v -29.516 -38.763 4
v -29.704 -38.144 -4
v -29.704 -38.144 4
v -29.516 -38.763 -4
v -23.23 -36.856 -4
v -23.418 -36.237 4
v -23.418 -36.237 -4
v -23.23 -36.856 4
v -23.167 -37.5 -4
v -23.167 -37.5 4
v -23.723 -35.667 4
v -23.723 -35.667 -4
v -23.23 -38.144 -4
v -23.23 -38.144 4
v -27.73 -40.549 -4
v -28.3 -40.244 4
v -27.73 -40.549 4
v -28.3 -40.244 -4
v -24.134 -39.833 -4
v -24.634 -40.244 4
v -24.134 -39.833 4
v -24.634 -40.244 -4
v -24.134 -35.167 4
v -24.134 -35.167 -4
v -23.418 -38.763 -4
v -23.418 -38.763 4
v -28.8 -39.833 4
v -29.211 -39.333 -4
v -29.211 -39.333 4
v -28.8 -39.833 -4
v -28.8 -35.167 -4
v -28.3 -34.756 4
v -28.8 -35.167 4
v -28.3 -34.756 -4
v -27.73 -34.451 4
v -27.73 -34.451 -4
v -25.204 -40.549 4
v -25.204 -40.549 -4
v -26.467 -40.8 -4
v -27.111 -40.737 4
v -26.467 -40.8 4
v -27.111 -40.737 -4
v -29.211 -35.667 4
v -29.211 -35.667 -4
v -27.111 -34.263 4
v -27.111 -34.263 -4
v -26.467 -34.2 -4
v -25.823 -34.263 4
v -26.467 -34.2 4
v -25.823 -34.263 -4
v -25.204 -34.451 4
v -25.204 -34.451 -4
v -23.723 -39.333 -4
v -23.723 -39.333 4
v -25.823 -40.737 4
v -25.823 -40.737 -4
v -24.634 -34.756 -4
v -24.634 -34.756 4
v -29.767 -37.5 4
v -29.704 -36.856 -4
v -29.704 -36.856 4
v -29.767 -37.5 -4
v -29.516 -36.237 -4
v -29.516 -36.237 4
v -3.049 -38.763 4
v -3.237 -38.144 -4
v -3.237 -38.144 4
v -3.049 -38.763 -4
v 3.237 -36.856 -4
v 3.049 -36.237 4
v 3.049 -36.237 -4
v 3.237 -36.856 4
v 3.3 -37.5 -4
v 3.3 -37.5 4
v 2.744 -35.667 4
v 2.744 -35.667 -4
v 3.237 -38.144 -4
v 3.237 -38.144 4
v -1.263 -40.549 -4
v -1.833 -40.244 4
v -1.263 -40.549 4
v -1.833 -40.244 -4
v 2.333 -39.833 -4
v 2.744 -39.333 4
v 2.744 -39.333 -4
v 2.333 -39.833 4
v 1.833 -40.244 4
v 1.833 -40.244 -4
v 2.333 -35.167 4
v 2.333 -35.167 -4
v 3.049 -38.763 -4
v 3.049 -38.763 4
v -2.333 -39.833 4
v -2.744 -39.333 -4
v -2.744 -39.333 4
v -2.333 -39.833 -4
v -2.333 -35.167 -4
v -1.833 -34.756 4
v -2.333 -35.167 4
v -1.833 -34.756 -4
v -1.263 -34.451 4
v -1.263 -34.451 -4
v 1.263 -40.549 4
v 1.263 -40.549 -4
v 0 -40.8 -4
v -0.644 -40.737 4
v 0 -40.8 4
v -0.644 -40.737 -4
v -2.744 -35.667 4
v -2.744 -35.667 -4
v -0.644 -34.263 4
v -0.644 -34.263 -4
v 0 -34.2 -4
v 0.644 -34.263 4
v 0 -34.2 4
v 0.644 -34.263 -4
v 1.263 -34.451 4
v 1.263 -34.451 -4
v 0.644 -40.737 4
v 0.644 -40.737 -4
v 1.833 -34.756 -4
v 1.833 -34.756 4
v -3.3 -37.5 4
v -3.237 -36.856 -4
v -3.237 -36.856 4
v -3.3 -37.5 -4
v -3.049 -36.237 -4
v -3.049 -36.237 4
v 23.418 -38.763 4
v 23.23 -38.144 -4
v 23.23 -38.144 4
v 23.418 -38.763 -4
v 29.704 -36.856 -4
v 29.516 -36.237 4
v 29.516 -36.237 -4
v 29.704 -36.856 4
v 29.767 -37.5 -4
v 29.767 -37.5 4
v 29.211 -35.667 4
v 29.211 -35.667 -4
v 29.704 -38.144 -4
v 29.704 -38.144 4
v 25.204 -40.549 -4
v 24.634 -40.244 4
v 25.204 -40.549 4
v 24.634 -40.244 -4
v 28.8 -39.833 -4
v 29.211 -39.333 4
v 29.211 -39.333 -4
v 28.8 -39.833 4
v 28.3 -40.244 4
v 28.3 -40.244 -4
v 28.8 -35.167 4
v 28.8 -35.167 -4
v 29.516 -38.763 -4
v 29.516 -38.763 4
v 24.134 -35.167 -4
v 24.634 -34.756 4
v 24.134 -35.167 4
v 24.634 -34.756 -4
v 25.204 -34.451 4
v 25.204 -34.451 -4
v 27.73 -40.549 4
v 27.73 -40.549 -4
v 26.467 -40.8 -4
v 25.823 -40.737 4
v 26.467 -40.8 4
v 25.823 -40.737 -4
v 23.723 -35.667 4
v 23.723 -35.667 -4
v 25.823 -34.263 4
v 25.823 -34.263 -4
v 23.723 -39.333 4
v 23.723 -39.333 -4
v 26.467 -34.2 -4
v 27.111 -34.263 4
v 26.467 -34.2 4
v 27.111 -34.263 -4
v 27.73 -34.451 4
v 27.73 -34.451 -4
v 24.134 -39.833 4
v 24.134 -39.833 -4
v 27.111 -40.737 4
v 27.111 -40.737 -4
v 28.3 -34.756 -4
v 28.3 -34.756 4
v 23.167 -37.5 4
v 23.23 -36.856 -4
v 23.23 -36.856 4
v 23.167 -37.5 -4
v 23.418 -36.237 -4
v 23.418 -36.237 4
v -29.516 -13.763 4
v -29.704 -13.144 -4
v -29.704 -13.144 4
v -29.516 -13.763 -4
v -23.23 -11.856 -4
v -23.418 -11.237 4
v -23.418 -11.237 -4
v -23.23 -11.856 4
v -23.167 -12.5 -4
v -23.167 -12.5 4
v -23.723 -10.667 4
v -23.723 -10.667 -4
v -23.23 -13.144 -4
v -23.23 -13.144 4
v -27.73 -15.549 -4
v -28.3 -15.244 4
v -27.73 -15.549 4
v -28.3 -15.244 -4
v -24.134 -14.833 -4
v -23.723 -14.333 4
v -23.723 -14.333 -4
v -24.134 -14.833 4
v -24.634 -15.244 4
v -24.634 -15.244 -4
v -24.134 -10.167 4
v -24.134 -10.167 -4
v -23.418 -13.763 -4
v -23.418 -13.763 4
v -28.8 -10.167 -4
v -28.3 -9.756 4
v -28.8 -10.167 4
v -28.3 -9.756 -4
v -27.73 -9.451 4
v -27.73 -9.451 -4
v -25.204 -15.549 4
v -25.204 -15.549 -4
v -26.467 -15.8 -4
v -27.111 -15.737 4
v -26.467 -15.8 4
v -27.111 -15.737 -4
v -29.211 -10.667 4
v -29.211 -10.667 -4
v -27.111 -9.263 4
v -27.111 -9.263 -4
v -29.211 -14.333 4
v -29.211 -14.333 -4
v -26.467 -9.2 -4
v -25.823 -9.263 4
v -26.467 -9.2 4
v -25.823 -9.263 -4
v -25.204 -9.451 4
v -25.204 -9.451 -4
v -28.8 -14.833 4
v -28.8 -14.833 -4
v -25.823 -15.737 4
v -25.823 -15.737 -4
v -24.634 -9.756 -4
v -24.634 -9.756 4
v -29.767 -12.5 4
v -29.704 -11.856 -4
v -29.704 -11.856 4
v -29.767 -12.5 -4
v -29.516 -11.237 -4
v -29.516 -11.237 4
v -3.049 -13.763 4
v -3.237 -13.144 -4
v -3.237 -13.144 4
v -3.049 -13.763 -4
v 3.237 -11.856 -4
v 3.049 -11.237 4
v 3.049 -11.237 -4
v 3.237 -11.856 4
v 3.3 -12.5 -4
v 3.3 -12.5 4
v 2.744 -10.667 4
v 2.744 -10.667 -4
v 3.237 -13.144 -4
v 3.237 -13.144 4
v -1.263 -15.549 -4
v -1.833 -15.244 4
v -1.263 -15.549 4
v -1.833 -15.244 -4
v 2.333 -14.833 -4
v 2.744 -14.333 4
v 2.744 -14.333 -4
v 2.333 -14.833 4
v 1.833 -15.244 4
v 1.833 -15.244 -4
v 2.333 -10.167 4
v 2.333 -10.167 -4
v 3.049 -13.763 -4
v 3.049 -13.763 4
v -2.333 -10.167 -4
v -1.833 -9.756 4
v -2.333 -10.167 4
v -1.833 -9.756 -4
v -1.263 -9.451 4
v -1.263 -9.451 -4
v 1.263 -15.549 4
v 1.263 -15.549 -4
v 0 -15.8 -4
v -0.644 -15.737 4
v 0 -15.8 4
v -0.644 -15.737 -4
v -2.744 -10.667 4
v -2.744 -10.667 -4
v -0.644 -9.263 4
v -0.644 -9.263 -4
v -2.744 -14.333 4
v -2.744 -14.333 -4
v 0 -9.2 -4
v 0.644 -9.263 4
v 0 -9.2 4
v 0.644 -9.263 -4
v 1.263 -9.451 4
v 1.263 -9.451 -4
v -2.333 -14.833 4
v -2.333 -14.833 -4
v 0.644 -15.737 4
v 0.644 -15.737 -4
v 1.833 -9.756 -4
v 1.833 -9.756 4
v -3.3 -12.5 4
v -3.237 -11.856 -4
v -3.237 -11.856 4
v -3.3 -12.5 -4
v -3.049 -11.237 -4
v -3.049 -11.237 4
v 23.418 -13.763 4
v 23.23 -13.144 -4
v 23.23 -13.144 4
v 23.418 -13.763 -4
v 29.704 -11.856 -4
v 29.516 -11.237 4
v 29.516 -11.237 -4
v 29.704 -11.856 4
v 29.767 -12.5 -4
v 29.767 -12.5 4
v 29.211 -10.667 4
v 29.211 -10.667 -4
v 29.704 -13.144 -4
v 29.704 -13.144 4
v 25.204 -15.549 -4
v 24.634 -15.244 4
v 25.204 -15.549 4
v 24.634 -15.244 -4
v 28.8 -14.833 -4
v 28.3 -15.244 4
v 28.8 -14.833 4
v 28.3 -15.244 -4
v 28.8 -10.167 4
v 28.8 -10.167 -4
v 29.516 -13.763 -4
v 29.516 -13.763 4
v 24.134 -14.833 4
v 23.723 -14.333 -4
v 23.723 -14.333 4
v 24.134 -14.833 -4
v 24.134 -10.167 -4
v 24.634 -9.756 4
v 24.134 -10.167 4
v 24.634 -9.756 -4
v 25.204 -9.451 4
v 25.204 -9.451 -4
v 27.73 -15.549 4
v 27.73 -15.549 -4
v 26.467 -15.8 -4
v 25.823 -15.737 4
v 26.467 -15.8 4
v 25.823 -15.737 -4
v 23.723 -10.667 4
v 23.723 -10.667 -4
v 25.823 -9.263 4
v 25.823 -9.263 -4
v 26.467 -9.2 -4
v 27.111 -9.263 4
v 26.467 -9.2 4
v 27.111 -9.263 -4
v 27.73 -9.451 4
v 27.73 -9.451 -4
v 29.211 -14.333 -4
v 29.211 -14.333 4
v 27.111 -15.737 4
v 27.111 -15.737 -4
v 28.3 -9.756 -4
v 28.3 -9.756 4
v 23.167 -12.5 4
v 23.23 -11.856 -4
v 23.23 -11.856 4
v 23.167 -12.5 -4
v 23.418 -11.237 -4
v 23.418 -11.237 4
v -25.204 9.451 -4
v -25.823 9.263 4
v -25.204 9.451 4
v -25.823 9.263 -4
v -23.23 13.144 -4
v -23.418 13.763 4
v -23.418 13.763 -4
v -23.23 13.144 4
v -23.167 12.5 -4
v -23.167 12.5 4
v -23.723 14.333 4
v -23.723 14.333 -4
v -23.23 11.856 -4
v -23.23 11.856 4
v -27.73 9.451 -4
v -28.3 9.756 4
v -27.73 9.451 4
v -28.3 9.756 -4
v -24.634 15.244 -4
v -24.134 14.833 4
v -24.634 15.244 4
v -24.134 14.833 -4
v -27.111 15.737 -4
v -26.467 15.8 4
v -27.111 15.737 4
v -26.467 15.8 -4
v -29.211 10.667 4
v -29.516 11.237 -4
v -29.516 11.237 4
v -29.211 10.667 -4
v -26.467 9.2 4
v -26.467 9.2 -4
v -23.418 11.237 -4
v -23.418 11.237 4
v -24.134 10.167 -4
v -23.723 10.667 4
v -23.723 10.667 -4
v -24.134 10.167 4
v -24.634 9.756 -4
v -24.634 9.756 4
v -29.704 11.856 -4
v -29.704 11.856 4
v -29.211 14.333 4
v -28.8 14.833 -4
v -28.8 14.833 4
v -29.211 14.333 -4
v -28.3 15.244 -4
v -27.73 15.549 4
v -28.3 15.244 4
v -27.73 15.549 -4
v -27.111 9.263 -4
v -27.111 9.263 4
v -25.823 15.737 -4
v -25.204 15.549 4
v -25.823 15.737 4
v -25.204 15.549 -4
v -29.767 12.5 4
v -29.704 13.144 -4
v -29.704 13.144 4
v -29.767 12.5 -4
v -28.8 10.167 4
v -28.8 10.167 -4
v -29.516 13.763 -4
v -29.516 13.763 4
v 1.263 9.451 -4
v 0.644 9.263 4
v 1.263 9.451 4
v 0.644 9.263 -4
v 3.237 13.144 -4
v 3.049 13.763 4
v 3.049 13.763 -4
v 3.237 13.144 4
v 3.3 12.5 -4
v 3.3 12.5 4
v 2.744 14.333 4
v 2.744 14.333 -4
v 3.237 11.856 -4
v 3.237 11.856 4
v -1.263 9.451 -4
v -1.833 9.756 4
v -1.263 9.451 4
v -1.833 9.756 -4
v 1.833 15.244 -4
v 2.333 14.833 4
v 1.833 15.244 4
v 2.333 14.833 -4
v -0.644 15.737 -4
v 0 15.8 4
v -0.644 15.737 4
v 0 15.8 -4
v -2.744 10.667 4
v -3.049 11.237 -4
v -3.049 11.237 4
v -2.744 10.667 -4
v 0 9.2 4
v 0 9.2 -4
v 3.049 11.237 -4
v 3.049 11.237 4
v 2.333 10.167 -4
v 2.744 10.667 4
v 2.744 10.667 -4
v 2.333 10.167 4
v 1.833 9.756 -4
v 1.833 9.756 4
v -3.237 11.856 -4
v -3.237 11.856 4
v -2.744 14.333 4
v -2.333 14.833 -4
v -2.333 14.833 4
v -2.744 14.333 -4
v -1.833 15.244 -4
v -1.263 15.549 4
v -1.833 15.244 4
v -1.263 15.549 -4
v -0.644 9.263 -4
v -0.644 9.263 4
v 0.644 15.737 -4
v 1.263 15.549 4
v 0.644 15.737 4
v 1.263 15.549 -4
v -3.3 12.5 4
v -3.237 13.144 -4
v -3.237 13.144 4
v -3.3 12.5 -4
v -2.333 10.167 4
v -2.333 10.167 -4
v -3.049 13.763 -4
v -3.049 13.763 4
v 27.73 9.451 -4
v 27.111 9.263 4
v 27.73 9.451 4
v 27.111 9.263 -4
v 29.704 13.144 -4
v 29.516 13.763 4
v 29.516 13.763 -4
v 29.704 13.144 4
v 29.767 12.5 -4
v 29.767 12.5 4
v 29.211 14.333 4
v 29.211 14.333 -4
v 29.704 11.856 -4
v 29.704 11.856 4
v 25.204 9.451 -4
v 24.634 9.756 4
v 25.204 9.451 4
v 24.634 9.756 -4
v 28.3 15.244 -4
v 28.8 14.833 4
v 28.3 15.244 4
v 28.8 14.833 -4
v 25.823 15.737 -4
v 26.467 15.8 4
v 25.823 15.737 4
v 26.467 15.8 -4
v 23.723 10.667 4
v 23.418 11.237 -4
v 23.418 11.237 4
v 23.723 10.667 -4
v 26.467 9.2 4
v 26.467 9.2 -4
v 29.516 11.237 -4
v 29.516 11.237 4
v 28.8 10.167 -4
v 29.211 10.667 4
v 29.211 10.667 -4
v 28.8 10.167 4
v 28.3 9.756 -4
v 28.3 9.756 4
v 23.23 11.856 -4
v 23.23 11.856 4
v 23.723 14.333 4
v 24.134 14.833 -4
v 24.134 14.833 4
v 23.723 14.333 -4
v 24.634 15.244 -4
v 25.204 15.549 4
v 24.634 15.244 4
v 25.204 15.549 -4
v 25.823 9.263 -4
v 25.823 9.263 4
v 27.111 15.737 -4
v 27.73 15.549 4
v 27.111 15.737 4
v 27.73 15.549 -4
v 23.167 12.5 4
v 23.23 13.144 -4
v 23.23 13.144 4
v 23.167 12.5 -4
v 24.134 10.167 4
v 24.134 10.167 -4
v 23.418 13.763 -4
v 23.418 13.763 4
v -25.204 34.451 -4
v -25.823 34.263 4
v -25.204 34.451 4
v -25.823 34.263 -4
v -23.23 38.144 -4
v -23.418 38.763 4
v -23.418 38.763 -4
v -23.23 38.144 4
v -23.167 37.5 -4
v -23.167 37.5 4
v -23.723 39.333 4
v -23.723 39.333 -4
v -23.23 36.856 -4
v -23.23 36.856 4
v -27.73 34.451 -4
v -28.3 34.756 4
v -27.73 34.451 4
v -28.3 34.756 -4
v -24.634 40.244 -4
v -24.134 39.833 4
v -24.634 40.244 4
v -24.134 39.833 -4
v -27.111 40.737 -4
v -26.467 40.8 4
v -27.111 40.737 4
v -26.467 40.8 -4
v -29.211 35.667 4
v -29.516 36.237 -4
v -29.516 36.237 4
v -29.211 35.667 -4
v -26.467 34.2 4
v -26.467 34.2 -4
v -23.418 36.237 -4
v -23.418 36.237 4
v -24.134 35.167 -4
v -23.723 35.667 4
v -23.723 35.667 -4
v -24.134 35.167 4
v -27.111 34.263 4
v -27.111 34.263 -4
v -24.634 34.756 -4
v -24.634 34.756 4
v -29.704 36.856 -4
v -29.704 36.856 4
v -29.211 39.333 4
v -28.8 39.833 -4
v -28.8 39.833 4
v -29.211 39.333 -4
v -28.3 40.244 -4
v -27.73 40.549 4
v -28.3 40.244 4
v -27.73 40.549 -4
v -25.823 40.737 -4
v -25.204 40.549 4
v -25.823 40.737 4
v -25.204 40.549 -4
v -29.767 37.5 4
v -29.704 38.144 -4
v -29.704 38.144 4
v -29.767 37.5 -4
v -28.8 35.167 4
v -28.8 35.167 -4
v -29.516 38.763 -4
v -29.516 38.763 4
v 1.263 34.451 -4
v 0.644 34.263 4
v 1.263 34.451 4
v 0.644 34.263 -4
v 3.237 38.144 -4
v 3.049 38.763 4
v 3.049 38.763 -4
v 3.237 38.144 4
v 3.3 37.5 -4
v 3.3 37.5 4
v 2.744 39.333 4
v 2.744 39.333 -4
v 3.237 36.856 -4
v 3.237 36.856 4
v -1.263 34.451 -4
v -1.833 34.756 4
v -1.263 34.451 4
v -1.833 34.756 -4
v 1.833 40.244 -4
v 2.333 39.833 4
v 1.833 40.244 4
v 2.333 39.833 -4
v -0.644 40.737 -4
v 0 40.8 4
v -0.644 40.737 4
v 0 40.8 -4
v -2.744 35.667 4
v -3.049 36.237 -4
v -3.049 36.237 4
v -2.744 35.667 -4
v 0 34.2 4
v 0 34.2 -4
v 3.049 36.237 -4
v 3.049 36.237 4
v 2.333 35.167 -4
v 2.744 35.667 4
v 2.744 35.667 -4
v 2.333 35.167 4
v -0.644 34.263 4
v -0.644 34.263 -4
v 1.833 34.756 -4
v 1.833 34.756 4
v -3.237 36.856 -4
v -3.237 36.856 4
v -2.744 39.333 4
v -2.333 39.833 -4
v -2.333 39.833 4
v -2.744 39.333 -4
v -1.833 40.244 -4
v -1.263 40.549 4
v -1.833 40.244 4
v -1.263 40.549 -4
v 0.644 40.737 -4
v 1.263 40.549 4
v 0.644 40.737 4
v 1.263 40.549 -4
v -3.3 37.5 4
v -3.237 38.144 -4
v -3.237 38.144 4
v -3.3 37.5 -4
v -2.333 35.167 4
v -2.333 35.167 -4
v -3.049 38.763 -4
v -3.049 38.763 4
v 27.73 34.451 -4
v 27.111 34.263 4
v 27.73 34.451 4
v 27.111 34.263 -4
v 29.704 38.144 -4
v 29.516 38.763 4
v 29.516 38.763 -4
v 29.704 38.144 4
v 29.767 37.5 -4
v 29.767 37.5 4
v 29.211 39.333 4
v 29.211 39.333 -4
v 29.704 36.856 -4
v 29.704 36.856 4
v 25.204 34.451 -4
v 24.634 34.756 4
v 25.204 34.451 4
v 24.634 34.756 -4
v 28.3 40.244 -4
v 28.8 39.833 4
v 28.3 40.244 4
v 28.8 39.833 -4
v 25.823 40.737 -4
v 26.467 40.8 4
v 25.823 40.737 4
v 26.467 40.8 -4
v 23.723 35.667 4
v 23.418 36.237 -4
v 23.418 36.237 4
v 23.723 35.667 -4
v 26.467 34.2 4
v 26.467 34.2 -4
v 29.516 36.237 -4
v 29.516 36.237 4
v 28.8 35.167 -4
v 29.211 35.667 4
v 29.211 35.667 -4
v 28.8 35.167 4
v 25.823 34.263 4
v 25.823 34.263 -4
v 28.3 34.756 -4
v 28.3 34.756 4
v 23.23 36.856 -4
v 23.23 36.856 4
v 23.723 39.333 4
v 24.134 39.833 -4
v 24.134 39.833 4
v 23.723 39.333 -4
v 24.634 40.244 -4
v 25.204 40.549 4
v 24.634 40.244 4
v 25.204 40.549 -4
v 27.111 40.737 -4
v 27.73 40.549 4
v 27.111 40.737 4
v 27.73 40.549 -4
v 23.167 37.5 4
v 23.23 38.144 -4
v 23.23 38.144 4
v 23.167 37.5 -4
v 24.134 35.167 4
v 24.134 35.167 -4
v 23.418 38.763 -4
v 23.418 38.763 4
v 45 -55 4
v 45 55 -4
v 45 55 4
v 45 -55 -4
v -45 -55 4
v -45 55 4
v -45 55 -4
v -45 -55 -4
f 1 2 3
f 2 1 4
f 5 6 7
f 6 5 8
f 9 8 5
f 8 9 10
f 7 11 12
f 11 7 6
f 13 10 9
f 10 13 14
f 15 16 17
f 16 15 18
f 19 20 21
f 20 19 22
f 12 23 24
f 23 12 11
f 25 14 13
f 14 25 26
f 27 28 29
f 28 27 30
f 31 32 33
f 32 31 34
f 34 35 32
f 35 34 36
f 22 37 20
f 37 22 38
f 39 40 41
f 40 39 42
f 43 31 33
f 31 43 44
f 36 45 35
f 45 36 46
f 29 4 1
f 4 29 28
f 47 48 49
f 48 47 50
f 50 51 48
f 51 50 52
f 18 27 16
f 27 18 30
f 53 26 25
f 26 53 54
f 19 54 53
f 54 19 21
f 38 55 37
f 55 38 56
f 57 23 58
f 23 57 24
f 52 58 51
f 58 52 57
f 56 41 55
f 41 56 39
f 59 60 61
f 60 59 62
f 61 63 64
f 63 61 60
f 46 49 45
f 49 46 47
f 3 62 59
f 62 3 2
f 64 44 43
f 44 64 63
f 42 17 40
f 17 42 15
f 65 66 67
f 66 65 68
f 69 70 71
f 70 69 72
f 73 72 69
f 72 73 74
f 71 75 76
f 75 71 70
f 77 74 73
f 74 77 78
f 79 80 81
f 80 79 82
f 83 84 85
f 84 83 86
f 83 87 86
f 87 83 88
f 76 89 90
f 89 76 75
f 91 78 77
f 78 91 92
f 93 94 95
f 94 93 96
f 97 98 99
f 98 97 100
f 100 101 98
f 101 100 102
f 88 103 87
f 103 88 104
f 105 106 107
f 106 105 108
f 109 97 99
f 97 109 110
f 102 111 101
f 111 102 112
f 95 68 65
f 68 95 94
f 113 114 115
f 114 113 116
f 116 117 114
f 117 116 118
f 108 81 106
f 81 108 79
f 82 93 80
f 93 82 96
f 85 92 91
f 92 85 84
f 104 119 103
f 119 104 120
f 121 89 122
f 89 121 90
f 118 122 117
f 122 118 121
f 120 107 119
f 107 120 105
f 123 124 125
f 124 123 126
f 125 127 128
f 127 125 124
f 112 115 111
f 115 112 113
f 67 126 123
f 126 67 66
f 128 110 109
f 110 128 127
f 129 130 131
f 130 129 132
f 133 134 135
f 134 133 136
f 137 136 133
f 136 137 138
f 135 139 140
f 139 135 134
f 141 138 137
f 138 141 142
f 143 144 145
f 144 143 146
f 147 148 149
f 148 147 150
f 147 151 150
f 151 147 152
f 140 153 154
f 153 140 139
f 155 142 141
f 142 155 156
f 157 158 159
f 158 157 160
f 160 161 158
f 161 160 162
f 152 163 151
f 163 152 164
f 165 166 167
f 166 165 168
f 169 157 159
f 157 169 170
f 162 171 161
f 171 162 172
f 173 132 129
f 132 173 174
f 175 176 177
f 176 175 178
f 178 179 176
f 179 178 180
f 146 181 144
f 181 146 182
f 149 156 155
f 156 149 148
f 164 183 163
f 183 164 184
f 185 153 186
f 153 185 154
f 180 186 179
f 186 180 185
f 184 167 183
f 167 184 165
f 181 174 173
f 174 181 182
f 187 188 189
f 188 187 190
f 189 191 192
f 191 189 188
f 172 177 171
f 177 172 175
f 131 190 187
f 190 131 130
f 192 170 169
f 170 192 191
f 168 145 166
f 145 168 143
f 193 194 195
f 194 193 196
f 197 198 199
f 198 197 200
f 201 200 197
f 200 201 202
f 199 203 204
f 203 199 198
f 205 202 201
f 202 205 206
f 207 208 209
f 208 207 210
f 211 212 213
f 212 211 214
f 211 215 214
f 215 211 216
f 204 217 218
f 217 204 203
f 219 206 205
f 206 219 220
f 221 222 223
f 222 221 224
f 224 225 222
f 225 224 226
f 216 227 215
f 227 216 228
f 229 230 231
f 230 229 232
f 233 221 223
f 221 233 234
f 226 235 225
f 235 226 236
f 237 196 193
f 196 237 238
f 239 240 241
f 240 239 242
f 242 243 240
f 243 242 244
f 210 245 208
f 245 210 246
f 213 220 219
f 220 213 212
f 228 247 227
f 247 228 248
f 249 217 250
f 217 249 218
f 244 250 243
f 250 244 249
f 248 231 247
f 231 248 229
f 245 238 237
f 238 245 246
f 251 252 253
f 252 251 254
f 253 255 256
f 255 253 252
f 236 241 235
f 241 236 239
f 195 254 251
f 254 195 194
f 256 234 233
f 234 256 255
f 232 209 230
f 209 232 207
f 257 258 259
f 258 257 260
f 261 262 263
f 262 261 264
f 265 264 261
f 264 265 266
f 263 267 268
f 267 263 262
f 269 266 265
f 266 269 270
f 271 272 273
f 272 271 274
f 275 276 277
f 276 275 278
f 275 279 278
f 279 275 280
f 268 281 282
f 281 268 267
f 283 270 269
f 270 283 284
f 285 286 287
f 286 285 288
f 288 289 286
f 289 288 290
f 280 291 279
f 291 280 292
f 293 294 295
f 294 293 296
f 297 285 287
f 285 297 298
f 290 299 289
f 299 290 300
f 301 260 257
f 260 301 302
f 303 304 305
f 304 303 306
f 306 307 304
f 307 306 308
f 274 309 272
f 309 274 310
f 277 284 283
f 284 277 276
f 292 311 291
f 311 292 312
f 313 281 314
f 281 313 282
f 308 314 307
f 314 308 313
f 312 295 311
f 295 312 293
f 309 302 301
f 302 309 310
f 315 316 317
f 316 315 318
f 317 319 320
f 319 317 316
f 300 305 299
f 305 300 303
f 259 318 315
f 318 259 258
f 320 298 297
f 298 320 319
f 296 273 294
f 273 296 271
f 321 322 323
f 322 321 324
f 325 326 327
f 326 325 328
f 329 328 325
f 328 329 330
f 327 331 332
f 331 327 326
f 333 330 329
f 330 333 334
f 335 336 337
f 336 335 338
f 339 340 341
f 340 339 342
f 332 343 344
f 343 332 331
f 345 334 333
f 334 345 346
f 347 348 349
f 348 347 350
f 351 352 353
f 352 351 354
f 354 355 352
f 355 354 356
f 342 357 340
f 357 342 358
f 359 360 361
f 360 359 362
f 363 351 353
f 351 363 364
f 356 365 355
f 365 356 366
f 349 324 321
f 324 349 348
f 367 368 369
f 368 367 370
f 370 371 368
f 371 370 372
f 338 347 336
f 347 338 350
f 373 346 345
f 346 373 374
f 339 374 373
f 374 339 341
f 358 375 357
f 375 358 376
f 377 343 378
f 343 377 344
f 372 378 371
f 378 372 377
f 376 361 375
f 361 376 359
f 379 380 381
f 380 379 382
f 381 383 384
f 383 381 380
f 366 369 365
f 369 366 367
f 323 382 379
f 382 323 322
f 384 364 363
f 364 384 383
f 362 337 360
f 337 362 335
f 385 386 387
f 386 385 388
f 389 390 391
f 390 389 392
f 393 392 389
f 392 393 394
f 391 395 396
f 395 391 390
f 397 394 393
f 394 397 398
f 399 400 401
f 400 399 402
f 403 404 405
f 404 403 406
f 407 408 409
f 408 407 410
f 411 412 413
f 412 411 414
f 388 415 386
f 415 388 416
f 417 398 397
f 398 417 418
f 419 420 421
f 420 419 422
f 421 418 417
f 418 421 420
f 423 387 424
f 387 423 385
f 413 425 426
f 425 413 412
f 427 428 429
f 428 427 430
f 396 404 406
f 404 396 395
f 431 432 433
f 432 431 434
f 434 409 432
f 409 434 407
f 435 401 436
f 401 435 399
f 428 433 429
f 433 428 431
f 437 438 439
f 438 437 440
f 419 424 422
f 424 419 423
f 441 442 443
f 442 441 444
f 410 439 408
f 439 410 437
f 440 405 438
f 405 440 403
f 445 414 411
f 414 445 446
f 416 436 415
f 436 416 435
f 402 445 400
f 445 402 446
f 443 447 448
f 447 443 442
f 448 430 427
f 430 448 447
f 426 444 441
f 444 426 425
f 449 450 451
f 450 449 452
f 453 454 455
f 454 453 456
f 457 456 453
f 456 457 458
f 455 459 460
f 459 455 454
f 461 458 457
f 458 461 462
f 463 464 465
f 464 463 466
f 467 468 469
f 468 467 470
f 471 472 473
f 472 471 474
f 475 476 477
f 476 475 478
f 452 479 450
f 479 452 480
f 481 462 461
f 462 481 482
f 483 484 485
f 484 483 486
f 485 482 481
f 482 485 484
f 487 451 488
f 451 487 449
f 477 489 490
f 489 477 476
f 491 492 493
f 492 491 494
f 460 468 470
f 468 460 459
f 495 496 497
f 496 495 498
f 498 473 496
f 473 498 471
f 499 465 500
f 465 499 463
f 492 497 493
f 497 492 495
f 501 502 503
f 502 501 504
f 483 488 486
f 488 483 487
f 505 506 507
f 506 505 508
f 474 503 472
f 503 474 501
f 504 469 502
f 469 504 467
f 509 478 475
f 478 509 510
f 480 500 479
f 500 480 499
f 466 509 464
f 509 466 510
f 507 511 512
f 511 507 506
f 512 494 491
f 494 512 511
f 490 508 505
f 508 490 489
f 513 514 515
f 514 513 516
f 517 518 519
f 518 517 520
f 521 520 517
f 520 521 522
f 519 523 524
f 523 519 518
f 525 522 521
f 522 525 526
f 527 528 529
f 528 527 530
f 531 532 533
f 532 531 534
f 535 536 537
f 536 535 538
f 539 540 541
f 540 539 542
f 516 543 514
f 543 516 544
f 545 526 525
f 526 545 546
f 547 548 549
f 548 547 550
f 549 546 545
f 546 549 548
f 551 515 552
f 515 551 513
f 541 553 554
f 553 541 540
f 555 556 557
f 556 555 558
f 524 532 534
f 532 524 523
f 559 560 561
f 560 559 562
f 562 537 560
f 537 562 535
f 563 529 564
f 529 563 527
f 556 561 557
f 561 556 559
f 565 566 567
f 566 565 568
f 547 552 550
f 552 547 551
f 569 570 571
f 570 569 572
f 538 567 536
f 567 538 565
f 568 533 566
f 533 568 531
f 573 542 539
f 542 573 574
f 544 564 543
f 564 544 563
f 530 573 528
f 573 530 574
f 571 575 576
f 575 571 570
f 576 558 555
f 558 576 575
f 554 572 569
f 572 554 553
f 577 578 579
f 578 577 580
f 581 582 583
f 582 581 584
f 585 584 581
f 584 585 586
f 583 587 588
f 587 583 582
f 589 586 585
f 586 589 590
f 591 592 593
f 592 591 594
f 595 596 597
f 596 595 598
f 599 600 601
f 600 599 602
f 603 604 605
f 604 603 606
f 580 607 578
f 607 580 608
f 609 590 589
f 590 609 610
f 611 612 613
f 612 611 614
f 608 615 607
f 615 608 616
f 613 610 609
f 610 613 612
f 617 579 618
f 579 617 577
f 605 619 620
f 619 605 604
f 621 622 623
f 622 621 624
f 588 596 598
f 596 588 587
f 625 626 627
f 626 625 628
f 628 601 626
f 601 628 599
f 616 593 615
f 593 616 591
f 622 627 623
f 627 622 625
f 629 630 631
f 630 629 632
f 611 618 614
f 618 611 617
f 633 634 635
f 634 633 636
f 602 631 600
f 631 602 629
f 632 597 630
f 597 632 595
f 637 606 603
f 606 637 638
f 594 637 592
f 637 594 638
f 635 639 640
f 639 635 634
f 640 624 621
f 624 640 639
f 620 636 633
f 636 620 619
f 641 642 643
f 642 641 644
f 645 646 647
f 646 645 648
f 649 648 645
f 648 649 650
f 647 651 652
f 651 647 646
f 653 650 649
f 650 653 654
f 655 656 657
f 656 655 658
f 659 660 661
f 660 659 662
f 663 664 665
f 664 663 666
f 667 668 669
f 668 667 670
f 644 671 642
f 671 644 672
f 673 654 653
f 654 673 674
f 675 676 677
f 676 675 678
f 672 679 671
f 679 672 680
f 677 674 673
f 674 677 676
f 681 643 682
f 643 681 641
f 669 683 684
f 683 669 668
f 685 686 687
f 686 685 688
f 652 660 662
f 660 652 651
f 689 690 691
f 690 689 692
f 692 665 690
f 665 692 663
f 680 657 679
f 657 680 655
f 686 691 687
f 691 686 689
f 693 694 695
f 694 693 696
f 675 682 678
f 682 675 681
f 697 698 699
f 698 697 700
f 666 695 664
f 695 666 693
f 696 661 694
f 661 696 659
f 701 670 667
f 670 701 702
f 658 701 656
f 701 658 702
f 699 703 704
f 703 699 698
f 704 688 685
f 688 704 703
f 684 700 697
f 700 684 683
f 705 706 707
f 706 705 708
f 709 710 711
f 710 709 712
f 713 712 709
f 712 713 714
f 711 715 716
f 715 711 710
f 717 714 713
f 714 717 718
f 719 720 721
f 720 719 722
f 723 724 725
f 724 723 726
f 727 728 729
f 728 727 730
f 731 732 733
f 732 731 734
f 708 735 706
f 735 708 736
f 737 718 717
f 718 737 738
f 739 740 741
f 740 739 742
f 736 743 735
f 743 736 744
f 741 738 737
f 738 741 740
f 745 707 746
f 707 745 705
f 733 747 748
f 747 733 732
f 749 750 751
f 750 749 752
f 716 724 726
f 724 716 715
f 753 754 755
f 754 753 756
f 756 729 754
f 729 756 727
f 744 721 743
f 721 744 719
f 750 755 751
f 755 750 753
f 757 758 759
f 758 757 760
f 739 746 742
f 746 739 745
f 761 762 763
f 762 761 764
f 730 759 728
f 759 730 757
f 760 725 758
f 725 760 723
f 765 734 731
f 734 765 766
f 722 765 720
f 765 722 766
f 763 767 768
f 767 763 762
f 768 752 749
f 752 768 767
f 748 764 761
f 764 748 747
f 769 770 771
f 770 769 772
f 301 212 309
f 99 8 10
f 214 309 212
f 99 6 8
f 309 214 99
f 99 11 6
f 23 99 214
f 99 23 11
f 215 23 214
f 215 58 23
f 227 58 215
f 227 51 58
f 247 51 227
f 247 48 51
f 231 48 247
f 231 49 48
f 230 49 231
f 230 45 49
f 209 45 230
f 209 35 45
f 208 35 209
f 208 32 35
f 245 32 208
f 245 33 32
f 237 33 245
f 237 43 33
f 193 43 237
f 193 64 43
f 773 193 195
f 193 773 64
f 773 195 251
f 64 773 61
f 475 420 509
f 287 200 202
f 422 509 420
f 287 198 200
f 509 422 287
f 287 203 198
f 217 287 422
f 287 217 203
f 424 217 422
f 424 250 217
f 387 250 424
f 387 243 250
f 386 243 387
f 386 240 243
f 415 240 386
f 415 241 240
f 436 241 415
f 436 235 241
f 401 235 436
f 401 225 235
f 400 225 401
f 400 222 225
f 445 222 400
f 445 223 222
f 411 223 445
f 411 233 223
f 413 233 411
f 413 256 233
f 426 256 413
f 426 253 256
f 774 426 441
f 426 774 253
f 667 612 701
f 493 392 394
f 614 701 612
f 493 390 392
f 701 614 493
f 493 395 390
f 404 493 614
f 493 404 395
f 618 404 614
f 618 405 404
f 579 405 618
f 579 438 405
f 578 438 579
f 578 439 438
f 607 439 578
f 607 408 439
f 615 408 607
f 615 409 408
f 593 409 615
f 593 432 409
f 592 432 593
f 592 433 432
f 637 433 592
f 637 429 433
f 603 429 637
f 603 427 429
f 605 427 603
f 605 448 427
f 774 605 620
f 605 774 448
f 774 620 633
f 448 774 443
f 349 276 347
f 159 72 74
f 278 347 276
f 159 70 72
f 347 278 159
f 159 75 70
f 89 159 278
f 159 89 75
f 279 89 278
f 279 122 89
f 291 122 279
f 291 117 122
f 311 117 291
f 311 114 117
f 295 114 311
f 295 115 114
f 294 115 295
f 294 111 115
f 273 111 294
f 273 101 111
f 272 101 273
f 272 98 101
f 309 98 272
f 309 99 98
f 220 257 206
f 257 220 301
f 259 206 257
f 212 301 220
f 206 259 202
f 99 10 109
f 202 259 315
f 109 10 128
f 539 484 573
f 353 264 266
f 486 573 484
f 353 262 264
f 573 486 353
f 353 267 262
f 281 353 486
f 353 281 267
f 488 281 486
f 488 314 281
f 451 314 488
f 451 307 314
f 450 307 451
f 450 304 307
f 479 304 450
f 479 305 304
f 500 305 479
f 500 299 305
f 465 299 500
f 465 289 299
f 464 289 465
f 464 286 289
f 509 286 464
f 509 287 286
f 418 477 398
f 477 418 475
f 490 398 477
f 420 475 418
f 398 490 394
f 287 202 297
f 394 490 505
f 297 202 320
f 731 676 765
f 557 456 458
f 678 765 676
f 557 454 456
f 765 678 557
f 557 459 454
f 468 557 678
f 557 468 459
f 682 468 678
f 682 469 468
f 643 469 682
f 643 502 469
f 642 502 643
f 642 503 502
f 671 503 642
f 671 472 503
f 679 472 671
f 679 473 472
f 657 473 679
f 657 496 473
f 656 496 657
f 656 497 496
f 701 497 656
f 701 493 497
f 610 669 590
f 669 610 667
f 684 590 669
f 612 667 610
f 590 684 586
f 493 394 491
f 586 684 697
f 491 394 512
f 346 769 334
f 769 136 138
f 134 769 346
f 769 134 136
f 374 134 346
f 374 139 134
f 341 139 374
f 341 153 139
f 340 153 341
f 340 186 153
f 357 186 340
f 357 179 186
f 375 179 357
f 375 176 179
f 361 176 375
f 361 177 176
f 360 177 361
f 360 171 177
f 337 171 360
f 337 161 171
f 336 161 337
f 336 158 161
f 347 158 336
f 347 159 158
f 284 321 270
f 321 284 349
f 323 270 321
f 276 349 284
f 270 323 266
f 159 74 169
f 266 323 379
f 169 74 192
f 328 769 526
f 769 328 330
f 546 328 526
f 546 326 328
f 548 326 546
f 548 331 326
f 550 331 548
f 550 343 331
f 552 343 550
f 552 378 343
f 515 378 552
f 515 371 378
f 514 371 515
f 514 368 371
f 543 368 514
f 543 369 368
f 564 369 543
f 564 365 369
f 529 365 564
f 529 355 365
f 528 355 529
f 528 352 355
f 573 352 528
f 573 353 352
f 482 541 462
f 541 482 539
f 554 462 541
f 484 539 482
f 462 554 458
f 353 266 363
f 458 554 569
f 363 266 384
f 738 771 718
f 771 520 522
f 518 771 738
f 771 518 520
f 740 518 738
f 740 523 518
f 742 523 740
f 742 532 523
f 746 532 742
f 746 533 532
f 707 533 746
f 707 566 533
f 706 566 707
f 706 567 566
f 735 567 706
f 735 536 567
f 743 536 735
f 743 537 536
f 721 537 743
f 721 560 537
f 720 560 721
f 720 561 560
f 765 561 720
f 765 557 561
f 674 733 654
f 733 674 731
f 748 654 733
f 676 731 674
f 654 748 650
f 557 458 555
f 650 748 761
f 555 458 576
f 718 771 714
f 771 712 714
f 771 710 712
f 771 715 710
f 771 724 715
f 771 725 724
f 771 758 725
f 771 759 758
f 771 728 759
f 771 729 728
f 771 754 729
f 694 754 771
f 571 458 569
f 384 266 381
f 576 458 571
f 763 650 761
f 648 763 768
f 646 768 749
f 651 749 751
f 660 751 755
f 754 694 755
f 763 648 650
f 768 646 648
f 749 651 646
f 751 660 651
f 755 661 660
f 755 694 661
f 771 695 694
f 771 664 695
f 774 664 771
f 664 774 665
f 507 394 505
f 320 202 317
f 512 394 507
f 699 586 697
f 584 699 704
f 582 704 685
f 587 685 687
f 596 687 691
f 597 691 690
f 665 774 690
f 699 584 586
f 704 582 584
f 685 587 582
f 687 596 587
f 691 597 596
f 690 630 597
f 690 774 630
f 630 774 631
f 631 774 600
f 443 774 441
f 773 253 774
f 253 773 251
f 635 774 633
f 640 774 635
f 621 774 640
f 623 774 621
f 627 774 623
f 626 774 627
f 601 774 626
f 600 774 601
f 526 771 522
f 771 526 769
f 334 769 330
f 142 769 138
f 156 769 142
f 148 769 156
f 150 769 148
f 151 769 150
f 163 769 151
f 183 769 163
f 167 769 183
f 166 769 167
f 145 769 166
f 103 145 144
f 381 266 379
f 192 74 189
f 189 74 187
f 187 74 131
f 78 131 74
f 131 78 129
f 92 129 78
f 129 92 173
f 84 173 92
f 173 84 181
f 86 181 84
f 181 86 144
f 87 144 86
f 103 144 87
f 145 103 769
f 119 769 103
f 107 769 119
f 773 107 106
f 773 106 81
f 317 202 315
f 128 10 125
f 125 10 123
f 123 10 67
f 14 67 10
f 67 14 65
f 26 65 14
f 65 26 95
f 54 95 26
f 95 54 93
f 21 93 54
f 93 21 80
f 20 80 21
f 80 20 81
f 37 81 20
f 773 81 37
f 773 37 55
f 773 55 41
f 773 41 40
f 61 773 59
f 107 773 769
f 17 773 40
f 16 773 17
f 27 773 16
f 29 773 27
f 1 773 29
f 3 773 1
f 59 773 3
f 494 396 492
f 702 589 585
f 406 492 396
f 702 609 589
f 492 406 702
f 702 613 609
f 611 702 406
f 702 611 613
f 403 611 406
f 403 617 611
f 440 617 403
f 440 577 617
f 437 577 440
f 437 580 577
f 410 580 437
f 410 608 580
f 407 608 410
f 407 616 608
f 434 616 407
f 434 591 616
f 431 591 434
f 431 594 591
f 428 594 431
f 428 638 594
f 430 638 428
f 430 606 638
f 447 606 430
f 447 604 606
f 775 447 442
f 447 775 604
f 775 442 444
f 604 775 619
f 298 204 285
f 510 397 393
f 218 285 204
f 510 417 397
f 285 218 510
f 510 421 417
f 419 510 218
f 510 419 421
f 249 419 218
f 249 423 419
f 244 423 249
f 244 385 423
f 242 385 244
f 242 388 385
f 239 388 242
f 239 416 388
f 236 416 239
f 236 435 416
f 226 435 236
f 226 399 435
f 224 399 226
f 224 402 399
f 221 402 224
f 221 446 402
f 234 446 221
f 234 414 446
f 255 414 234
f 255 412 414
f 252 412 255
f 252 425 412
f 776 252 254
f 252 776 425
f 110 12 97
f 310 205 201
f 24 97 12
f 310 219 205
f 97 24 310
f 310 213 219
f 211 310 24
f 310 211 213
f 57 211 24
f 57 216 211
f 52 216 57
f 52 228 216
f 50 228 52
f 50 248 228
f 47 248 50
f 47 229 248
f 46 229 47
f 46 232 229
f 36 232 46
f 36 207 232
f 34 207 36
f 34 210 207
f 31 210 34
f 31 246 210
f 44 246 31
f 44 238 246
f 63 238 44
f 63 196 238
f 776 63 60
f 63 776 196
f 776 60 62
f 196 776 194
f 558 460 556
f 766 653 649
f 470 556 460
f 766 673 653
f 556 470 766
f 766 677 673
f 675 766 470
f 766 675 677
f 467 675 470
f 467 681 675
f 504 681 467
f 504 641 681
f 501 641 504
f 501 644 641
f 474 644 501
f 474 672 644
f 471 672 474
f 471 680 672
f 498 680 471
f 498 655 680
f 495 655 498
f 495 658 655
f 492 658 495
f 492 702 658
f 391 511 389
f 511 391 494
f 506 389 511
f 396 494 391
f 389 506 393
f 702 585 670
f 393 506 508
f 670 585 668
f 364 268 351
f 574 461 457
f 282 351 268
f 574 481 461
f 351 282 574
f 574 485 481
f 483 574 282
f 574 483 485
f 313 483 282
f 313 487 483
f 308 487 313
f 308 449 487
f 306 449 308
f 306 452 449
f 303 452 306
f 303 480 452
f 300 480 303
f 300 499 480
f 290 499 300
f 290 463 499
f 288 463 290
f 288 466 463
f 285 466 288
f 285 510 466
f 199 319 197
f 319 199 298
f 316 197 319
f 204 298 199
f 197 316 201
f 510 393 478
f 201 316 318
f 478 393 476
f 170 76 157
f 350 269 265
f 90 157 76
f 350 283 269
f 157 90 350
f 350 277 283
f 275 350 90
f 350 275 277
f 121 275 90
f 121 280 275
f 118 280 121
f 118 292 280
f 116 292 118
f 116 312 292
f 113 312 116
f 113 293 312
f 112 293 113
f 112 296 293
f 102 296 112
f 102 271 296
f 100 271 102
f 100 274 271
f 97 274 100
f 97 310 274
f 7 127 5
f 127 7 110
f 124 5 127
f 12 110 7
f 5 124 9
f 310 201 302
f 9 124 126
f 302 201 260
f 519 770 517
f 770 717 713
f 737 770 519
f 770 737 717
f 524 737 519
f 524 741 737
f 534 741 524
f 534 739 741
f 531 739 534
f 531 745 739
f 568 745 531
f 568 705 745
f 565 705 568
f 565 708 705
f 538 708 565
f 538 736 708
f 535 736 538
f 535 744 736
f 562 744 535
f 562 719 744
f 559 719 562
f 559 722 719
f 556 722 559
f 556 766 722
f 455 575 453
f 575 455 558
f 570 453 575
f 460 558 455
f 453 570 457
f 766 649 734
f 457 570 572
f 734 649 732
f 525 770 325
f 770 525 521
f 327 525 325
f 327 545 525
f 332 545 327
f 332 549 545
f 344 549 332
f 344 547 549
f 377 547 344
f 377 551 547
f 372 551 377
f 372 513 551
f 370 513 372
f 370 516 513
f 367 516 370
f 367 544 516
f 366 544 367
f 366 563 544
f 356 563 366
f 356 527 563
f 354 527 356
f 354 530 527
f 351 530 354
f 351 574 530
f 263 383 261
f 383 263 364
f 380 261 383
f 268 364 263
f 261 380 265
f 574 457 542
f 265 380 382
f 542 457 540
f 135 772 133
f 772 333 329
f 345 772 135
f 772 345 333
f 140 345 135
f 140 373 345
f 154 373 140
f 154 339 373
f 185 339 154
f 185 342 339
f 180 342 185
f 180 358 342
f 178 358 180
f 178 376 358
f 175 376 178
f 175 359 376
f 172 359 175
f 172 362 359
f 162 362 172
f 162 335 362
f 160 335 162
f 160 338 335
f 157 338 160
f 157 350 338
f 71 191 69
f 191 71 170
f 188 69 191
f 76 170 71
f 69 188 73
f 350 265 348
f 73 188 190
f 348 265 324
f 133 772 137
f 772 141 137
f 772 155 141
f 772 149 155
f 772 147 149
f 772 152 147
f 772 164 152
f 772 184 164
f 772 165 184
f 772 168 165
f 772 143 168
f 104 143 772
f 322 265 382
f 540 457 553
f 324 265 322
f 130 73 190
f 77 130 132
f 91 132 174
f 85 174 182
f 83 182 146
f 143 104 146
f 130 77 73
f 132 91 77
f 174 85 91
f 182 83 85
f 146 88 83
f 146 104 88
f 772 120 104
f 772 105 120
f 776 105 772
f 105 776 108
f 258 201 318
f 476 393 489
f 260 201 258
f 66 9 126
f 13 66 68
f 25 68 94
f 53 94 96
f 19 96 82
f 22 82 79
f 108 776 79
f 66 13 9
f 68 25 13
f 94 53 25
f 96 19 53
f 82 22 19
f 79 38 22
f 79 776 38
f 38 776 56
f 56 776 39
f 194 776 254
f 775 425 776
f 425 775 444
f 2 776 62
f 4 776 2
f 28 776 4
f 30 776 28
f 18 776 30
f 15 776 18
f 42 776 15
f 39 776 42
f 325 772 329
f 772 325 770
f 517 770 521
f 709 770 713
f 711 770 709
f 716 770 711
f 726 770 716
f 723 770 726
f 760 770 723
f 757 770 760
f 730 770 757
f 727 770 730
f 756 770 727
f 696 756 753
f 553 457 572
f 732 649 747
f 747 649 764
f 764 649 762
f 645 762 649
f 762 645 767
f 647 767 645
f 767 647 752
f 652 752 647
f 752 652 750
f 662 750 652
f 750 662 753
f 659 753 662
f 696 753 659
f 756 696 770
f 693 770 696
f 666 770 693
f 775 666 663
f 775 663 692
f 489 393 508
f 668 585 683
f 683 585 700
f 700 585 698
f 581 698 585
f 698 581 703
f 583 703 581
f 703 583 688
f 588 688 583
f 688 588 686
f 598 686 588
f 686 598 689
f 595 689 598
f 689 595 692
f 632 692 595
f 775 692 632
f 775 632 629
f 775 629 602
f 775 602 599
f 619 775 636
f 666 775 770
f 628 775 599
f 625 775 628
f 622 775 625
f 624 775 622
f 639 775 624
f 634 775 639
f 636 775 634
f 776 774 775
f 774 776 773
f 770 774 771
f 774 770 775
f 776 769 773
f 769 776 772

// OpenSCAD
$fn = 32;

// ----------------------------------------------------------------------
// Perforated panel 90 x 110 x 8
// 4 x 3 Ø6.6 holes, grid layout
// ----------------------------------------------------------------------

// --- parameters (mm) ---
panel = [90, 110, 8];  // overall size (x, y, z)
hole_d = 6.6;          // hole diameter
pitch_x = 26.467;      // hole pitch along X
pitch_y = 25;          // hole pitch along Y

// --- derived feature positions (mm) ---
margin = hole_d / 2 + 2;            // = 5.3   clearance from the panel edge
cols = floor((panel[0] - 2 * margin) / pitch_x) + 1;  // = 3   how many columns fit in X
rows = floor((panel[1] - 2 * margin) / pitch_y) + 1;  // = 4   how many rows fit in Y
span_x = (cols - 1) * pitch_x + 0;  // = 52.93   width of the field
span_y = (rows - 1) * pitch_y;      // = 75   height of the field
origin_x = -span_x / 2;             // = -26.47   X of the first hole
origin_y = -span_y / 2;             // = -37.5   Y of the first row
holes = rows * cols;                // = 12   holes in total
feature_centers = [
  [origin_x + 0 * pitch_x, origin_y + 0 * pitch_y],
  [origin_x + 1 * pitch_x, origin_y + 0 * pitch_y],
  [origin_x + 2 * pitch_x, origin_y + 0 * pitch_y],
  [origin_x + 0 * pitch_x, origin_y + 1 * pitch_y],
  [origin_x + 1 * pitch_x, origin_y + 1 * pitch_y],
  [origin_x + 2 * pitch_x, origin_y + 1 * pitch_y],
  [origin_x + 0 * pitch_x, origin_y + 2 * pitch_y],
  [origin_x + 1 * pitch_x, origin_y + 2 * pitch_y],
  [origin_x + 2 * pitch_x, origin_y + 2 * pitch_y],
  [origin_x + 0 * pitch_x, origin_y + 3 * pitch_y],
  [origin_x + 1 * pitch_x, origin_y + 3 * pitch_y],
  [origin_x + 2 * pitch_x, origin_y + 3 * pitch_y]
];   // hole centres, used verbatim by the cutter loop

// panel outline, every hole through
difference() {
  cube(panel, center = true);
  for (centre = feature_centers)
    translate([centre[0], centre[1], 0])
      cylinder(d = hole_d, h = panel[2] + 2, center = true);
}
